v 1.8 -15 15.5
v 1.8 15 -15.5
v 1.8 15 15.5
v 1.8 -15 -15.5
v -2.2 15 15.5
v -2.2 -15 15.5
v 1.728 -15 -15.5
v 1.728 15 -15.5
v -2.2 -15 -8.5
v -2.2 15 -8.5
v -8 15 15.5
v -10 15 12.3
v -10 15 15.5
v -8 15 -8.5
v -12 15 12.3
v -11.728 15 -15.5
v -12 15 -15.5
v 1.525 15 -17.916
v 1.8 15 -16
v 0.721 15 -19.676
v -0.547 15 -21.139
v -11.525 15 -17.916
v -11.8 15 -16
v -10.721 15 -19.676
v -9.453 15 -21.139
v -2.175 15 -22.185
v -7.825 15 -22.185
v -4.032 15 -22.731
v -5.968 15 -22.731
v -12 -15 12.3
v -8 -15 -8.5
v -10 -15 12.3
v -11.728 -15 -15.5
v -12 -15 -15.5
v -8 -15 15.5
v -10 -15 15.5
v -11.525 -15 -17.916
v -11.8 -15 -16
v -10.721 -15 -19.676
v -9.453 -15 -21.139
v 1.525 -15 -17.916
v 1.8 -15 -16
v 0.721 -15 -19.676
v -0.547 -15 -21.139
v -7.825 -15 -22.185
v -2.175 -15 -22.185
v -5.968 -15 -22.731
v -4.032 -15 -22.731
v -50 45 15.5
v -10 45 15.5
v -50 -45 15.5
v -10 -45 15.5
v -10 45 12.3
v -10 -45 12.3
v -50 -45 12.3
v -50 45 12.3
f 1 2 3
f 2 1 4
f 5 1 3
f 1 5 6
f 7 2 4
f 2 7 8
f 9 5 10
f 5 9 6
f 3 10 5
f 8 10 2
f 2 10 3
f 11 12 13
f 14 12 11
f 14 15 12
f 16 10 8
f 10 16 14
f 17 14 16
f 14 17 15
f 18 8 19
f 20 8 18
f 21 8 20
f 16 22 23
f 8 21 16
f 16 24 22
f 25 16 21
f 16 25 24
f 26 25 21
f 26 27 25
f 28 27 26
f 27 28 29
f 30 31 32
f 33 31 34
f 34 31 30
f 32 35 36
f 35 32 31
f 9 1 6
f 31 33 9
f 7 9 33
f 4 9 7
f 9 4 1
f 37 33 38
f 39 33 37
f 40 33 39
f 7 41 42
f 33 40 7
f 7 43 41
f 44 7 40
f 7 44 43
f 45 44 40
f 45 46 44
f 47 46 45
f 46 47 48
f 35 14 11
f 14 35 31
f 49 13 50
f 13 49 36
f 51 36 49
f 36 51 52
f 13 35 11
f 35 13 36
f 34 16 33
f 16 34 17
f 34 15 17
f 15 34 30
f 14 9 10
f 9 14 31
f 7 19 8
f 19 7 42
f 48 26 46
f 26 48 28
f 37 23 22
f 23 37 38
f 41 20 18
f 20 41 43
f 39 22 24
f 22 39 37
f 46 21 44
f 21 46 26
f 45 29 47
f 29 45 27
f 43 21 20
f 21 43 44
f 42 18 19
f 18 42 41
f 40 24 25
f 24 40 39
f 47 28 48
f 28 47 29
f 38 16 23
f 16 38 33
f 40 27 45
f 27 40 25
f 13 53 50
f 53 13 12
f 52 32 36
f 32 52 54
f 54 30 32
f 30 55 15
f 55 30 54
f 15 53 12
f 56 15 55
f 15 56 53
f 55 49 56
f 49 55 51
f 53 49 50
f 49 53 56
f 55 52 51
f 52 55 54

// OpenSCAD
module cdSlot() {
  translate([-0.2, 0, 0]){
    cube(size=[4, 30, 31], center=true);
  }
  translate([-10, 0, 0]){
    cube(size=[4, 30, 31], center=true);
  }
  translate([-5, 0, -10]){
    cube(size=[7, 30, 3], center=true);
  }
  translate([-5, 0, -16]){
    rotate([90, 0, 0]) {
      cylinder(r=6.8, h=30, center=true);
    }
  }
  translate([-30, 0, 30/2-1.1]){
    cube(size=[40, 90, 3.2], center=true);
  }
}

module noteEdgePowerHolder() {
  hull() {
    //holdBlock
    translate([0, 0, 6]) {
      cube(size=[11, 30, 22], center=true);
    }
    //phoneBase
    translate([3, 0, 20]) {
      cube(size=[19, 162, 15], center=true);
    }
  }
  //phoneSideHolder
  translate([3, 0, 20]) {
    translate([0, 162/2-15/2, 10]) {
      cube(size=[19, 15, 35], center=true);
    }
    translate([0, -162/2+15/2, 10]) {
      cube(size=[19, 15, 35], center=true);
    }
  }
}

module noteEdgePower() {
  translate([3, 0, 37]) {
    cube(size=[15, 152, 40], center=true);
  }
}
/*
difference() {
  noteEdgePowerHolder();
  noteEdgePower();
  %cdSlot();
}
*/
cdSlot();
